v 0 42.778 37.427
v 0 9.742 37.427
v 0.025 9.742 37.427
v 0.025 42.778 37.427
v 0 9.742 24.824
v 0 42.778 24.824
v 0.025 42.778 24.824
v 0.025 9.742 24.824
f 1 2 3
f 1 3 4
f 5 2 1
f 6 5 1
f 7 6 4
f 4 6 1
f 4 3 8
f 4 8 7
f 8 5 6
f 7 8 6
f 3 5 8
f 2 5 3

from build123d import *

# Parameters (mm, degrees)
F1_DEPTH = 0.0254
F4_DEPTH = 0.0254
F5_W     = 33.0361854285
F5_H     = 12.603007257
F7_DEPTH = 0.0254


with BuildPart() as f1:
    # F0 (on Right) → F1 (new body)
    with BuildSketch(Plane.YZ):
        Polygon((-42.5828881562, 33.7989740074), (-55.3768500686, 33.7989740074), (-54.9949407578, 23.2964698225), (-42.5828881562, 23.2964698225), align=None)
    extrude(amount=F1_DEPTH)


with BuildPart() as f4:
    # F2 (on Right) → F4 (new body)
    with BuildSketch(Plane.YZ):
        Polygon((-15.8492363989, 37.4271124601), (-30.1708355546, 37.4271124601), (-30.1708355546, 23.6783772707), (-15.4673270881, 23.6783772707), align=None)
    extrude(amount=F4_DEPTH)


with BuildPart() as f7:
    # F5 (on Right) → F7 (new body)
    with BuildSketch(Plane.YZ):
        with Locations((26.2597678229, 31.1256088316)):
            Rectangle(F5_W, F5_H)
    extrude(amount=F7_DEPTH)


solid = f7.part
